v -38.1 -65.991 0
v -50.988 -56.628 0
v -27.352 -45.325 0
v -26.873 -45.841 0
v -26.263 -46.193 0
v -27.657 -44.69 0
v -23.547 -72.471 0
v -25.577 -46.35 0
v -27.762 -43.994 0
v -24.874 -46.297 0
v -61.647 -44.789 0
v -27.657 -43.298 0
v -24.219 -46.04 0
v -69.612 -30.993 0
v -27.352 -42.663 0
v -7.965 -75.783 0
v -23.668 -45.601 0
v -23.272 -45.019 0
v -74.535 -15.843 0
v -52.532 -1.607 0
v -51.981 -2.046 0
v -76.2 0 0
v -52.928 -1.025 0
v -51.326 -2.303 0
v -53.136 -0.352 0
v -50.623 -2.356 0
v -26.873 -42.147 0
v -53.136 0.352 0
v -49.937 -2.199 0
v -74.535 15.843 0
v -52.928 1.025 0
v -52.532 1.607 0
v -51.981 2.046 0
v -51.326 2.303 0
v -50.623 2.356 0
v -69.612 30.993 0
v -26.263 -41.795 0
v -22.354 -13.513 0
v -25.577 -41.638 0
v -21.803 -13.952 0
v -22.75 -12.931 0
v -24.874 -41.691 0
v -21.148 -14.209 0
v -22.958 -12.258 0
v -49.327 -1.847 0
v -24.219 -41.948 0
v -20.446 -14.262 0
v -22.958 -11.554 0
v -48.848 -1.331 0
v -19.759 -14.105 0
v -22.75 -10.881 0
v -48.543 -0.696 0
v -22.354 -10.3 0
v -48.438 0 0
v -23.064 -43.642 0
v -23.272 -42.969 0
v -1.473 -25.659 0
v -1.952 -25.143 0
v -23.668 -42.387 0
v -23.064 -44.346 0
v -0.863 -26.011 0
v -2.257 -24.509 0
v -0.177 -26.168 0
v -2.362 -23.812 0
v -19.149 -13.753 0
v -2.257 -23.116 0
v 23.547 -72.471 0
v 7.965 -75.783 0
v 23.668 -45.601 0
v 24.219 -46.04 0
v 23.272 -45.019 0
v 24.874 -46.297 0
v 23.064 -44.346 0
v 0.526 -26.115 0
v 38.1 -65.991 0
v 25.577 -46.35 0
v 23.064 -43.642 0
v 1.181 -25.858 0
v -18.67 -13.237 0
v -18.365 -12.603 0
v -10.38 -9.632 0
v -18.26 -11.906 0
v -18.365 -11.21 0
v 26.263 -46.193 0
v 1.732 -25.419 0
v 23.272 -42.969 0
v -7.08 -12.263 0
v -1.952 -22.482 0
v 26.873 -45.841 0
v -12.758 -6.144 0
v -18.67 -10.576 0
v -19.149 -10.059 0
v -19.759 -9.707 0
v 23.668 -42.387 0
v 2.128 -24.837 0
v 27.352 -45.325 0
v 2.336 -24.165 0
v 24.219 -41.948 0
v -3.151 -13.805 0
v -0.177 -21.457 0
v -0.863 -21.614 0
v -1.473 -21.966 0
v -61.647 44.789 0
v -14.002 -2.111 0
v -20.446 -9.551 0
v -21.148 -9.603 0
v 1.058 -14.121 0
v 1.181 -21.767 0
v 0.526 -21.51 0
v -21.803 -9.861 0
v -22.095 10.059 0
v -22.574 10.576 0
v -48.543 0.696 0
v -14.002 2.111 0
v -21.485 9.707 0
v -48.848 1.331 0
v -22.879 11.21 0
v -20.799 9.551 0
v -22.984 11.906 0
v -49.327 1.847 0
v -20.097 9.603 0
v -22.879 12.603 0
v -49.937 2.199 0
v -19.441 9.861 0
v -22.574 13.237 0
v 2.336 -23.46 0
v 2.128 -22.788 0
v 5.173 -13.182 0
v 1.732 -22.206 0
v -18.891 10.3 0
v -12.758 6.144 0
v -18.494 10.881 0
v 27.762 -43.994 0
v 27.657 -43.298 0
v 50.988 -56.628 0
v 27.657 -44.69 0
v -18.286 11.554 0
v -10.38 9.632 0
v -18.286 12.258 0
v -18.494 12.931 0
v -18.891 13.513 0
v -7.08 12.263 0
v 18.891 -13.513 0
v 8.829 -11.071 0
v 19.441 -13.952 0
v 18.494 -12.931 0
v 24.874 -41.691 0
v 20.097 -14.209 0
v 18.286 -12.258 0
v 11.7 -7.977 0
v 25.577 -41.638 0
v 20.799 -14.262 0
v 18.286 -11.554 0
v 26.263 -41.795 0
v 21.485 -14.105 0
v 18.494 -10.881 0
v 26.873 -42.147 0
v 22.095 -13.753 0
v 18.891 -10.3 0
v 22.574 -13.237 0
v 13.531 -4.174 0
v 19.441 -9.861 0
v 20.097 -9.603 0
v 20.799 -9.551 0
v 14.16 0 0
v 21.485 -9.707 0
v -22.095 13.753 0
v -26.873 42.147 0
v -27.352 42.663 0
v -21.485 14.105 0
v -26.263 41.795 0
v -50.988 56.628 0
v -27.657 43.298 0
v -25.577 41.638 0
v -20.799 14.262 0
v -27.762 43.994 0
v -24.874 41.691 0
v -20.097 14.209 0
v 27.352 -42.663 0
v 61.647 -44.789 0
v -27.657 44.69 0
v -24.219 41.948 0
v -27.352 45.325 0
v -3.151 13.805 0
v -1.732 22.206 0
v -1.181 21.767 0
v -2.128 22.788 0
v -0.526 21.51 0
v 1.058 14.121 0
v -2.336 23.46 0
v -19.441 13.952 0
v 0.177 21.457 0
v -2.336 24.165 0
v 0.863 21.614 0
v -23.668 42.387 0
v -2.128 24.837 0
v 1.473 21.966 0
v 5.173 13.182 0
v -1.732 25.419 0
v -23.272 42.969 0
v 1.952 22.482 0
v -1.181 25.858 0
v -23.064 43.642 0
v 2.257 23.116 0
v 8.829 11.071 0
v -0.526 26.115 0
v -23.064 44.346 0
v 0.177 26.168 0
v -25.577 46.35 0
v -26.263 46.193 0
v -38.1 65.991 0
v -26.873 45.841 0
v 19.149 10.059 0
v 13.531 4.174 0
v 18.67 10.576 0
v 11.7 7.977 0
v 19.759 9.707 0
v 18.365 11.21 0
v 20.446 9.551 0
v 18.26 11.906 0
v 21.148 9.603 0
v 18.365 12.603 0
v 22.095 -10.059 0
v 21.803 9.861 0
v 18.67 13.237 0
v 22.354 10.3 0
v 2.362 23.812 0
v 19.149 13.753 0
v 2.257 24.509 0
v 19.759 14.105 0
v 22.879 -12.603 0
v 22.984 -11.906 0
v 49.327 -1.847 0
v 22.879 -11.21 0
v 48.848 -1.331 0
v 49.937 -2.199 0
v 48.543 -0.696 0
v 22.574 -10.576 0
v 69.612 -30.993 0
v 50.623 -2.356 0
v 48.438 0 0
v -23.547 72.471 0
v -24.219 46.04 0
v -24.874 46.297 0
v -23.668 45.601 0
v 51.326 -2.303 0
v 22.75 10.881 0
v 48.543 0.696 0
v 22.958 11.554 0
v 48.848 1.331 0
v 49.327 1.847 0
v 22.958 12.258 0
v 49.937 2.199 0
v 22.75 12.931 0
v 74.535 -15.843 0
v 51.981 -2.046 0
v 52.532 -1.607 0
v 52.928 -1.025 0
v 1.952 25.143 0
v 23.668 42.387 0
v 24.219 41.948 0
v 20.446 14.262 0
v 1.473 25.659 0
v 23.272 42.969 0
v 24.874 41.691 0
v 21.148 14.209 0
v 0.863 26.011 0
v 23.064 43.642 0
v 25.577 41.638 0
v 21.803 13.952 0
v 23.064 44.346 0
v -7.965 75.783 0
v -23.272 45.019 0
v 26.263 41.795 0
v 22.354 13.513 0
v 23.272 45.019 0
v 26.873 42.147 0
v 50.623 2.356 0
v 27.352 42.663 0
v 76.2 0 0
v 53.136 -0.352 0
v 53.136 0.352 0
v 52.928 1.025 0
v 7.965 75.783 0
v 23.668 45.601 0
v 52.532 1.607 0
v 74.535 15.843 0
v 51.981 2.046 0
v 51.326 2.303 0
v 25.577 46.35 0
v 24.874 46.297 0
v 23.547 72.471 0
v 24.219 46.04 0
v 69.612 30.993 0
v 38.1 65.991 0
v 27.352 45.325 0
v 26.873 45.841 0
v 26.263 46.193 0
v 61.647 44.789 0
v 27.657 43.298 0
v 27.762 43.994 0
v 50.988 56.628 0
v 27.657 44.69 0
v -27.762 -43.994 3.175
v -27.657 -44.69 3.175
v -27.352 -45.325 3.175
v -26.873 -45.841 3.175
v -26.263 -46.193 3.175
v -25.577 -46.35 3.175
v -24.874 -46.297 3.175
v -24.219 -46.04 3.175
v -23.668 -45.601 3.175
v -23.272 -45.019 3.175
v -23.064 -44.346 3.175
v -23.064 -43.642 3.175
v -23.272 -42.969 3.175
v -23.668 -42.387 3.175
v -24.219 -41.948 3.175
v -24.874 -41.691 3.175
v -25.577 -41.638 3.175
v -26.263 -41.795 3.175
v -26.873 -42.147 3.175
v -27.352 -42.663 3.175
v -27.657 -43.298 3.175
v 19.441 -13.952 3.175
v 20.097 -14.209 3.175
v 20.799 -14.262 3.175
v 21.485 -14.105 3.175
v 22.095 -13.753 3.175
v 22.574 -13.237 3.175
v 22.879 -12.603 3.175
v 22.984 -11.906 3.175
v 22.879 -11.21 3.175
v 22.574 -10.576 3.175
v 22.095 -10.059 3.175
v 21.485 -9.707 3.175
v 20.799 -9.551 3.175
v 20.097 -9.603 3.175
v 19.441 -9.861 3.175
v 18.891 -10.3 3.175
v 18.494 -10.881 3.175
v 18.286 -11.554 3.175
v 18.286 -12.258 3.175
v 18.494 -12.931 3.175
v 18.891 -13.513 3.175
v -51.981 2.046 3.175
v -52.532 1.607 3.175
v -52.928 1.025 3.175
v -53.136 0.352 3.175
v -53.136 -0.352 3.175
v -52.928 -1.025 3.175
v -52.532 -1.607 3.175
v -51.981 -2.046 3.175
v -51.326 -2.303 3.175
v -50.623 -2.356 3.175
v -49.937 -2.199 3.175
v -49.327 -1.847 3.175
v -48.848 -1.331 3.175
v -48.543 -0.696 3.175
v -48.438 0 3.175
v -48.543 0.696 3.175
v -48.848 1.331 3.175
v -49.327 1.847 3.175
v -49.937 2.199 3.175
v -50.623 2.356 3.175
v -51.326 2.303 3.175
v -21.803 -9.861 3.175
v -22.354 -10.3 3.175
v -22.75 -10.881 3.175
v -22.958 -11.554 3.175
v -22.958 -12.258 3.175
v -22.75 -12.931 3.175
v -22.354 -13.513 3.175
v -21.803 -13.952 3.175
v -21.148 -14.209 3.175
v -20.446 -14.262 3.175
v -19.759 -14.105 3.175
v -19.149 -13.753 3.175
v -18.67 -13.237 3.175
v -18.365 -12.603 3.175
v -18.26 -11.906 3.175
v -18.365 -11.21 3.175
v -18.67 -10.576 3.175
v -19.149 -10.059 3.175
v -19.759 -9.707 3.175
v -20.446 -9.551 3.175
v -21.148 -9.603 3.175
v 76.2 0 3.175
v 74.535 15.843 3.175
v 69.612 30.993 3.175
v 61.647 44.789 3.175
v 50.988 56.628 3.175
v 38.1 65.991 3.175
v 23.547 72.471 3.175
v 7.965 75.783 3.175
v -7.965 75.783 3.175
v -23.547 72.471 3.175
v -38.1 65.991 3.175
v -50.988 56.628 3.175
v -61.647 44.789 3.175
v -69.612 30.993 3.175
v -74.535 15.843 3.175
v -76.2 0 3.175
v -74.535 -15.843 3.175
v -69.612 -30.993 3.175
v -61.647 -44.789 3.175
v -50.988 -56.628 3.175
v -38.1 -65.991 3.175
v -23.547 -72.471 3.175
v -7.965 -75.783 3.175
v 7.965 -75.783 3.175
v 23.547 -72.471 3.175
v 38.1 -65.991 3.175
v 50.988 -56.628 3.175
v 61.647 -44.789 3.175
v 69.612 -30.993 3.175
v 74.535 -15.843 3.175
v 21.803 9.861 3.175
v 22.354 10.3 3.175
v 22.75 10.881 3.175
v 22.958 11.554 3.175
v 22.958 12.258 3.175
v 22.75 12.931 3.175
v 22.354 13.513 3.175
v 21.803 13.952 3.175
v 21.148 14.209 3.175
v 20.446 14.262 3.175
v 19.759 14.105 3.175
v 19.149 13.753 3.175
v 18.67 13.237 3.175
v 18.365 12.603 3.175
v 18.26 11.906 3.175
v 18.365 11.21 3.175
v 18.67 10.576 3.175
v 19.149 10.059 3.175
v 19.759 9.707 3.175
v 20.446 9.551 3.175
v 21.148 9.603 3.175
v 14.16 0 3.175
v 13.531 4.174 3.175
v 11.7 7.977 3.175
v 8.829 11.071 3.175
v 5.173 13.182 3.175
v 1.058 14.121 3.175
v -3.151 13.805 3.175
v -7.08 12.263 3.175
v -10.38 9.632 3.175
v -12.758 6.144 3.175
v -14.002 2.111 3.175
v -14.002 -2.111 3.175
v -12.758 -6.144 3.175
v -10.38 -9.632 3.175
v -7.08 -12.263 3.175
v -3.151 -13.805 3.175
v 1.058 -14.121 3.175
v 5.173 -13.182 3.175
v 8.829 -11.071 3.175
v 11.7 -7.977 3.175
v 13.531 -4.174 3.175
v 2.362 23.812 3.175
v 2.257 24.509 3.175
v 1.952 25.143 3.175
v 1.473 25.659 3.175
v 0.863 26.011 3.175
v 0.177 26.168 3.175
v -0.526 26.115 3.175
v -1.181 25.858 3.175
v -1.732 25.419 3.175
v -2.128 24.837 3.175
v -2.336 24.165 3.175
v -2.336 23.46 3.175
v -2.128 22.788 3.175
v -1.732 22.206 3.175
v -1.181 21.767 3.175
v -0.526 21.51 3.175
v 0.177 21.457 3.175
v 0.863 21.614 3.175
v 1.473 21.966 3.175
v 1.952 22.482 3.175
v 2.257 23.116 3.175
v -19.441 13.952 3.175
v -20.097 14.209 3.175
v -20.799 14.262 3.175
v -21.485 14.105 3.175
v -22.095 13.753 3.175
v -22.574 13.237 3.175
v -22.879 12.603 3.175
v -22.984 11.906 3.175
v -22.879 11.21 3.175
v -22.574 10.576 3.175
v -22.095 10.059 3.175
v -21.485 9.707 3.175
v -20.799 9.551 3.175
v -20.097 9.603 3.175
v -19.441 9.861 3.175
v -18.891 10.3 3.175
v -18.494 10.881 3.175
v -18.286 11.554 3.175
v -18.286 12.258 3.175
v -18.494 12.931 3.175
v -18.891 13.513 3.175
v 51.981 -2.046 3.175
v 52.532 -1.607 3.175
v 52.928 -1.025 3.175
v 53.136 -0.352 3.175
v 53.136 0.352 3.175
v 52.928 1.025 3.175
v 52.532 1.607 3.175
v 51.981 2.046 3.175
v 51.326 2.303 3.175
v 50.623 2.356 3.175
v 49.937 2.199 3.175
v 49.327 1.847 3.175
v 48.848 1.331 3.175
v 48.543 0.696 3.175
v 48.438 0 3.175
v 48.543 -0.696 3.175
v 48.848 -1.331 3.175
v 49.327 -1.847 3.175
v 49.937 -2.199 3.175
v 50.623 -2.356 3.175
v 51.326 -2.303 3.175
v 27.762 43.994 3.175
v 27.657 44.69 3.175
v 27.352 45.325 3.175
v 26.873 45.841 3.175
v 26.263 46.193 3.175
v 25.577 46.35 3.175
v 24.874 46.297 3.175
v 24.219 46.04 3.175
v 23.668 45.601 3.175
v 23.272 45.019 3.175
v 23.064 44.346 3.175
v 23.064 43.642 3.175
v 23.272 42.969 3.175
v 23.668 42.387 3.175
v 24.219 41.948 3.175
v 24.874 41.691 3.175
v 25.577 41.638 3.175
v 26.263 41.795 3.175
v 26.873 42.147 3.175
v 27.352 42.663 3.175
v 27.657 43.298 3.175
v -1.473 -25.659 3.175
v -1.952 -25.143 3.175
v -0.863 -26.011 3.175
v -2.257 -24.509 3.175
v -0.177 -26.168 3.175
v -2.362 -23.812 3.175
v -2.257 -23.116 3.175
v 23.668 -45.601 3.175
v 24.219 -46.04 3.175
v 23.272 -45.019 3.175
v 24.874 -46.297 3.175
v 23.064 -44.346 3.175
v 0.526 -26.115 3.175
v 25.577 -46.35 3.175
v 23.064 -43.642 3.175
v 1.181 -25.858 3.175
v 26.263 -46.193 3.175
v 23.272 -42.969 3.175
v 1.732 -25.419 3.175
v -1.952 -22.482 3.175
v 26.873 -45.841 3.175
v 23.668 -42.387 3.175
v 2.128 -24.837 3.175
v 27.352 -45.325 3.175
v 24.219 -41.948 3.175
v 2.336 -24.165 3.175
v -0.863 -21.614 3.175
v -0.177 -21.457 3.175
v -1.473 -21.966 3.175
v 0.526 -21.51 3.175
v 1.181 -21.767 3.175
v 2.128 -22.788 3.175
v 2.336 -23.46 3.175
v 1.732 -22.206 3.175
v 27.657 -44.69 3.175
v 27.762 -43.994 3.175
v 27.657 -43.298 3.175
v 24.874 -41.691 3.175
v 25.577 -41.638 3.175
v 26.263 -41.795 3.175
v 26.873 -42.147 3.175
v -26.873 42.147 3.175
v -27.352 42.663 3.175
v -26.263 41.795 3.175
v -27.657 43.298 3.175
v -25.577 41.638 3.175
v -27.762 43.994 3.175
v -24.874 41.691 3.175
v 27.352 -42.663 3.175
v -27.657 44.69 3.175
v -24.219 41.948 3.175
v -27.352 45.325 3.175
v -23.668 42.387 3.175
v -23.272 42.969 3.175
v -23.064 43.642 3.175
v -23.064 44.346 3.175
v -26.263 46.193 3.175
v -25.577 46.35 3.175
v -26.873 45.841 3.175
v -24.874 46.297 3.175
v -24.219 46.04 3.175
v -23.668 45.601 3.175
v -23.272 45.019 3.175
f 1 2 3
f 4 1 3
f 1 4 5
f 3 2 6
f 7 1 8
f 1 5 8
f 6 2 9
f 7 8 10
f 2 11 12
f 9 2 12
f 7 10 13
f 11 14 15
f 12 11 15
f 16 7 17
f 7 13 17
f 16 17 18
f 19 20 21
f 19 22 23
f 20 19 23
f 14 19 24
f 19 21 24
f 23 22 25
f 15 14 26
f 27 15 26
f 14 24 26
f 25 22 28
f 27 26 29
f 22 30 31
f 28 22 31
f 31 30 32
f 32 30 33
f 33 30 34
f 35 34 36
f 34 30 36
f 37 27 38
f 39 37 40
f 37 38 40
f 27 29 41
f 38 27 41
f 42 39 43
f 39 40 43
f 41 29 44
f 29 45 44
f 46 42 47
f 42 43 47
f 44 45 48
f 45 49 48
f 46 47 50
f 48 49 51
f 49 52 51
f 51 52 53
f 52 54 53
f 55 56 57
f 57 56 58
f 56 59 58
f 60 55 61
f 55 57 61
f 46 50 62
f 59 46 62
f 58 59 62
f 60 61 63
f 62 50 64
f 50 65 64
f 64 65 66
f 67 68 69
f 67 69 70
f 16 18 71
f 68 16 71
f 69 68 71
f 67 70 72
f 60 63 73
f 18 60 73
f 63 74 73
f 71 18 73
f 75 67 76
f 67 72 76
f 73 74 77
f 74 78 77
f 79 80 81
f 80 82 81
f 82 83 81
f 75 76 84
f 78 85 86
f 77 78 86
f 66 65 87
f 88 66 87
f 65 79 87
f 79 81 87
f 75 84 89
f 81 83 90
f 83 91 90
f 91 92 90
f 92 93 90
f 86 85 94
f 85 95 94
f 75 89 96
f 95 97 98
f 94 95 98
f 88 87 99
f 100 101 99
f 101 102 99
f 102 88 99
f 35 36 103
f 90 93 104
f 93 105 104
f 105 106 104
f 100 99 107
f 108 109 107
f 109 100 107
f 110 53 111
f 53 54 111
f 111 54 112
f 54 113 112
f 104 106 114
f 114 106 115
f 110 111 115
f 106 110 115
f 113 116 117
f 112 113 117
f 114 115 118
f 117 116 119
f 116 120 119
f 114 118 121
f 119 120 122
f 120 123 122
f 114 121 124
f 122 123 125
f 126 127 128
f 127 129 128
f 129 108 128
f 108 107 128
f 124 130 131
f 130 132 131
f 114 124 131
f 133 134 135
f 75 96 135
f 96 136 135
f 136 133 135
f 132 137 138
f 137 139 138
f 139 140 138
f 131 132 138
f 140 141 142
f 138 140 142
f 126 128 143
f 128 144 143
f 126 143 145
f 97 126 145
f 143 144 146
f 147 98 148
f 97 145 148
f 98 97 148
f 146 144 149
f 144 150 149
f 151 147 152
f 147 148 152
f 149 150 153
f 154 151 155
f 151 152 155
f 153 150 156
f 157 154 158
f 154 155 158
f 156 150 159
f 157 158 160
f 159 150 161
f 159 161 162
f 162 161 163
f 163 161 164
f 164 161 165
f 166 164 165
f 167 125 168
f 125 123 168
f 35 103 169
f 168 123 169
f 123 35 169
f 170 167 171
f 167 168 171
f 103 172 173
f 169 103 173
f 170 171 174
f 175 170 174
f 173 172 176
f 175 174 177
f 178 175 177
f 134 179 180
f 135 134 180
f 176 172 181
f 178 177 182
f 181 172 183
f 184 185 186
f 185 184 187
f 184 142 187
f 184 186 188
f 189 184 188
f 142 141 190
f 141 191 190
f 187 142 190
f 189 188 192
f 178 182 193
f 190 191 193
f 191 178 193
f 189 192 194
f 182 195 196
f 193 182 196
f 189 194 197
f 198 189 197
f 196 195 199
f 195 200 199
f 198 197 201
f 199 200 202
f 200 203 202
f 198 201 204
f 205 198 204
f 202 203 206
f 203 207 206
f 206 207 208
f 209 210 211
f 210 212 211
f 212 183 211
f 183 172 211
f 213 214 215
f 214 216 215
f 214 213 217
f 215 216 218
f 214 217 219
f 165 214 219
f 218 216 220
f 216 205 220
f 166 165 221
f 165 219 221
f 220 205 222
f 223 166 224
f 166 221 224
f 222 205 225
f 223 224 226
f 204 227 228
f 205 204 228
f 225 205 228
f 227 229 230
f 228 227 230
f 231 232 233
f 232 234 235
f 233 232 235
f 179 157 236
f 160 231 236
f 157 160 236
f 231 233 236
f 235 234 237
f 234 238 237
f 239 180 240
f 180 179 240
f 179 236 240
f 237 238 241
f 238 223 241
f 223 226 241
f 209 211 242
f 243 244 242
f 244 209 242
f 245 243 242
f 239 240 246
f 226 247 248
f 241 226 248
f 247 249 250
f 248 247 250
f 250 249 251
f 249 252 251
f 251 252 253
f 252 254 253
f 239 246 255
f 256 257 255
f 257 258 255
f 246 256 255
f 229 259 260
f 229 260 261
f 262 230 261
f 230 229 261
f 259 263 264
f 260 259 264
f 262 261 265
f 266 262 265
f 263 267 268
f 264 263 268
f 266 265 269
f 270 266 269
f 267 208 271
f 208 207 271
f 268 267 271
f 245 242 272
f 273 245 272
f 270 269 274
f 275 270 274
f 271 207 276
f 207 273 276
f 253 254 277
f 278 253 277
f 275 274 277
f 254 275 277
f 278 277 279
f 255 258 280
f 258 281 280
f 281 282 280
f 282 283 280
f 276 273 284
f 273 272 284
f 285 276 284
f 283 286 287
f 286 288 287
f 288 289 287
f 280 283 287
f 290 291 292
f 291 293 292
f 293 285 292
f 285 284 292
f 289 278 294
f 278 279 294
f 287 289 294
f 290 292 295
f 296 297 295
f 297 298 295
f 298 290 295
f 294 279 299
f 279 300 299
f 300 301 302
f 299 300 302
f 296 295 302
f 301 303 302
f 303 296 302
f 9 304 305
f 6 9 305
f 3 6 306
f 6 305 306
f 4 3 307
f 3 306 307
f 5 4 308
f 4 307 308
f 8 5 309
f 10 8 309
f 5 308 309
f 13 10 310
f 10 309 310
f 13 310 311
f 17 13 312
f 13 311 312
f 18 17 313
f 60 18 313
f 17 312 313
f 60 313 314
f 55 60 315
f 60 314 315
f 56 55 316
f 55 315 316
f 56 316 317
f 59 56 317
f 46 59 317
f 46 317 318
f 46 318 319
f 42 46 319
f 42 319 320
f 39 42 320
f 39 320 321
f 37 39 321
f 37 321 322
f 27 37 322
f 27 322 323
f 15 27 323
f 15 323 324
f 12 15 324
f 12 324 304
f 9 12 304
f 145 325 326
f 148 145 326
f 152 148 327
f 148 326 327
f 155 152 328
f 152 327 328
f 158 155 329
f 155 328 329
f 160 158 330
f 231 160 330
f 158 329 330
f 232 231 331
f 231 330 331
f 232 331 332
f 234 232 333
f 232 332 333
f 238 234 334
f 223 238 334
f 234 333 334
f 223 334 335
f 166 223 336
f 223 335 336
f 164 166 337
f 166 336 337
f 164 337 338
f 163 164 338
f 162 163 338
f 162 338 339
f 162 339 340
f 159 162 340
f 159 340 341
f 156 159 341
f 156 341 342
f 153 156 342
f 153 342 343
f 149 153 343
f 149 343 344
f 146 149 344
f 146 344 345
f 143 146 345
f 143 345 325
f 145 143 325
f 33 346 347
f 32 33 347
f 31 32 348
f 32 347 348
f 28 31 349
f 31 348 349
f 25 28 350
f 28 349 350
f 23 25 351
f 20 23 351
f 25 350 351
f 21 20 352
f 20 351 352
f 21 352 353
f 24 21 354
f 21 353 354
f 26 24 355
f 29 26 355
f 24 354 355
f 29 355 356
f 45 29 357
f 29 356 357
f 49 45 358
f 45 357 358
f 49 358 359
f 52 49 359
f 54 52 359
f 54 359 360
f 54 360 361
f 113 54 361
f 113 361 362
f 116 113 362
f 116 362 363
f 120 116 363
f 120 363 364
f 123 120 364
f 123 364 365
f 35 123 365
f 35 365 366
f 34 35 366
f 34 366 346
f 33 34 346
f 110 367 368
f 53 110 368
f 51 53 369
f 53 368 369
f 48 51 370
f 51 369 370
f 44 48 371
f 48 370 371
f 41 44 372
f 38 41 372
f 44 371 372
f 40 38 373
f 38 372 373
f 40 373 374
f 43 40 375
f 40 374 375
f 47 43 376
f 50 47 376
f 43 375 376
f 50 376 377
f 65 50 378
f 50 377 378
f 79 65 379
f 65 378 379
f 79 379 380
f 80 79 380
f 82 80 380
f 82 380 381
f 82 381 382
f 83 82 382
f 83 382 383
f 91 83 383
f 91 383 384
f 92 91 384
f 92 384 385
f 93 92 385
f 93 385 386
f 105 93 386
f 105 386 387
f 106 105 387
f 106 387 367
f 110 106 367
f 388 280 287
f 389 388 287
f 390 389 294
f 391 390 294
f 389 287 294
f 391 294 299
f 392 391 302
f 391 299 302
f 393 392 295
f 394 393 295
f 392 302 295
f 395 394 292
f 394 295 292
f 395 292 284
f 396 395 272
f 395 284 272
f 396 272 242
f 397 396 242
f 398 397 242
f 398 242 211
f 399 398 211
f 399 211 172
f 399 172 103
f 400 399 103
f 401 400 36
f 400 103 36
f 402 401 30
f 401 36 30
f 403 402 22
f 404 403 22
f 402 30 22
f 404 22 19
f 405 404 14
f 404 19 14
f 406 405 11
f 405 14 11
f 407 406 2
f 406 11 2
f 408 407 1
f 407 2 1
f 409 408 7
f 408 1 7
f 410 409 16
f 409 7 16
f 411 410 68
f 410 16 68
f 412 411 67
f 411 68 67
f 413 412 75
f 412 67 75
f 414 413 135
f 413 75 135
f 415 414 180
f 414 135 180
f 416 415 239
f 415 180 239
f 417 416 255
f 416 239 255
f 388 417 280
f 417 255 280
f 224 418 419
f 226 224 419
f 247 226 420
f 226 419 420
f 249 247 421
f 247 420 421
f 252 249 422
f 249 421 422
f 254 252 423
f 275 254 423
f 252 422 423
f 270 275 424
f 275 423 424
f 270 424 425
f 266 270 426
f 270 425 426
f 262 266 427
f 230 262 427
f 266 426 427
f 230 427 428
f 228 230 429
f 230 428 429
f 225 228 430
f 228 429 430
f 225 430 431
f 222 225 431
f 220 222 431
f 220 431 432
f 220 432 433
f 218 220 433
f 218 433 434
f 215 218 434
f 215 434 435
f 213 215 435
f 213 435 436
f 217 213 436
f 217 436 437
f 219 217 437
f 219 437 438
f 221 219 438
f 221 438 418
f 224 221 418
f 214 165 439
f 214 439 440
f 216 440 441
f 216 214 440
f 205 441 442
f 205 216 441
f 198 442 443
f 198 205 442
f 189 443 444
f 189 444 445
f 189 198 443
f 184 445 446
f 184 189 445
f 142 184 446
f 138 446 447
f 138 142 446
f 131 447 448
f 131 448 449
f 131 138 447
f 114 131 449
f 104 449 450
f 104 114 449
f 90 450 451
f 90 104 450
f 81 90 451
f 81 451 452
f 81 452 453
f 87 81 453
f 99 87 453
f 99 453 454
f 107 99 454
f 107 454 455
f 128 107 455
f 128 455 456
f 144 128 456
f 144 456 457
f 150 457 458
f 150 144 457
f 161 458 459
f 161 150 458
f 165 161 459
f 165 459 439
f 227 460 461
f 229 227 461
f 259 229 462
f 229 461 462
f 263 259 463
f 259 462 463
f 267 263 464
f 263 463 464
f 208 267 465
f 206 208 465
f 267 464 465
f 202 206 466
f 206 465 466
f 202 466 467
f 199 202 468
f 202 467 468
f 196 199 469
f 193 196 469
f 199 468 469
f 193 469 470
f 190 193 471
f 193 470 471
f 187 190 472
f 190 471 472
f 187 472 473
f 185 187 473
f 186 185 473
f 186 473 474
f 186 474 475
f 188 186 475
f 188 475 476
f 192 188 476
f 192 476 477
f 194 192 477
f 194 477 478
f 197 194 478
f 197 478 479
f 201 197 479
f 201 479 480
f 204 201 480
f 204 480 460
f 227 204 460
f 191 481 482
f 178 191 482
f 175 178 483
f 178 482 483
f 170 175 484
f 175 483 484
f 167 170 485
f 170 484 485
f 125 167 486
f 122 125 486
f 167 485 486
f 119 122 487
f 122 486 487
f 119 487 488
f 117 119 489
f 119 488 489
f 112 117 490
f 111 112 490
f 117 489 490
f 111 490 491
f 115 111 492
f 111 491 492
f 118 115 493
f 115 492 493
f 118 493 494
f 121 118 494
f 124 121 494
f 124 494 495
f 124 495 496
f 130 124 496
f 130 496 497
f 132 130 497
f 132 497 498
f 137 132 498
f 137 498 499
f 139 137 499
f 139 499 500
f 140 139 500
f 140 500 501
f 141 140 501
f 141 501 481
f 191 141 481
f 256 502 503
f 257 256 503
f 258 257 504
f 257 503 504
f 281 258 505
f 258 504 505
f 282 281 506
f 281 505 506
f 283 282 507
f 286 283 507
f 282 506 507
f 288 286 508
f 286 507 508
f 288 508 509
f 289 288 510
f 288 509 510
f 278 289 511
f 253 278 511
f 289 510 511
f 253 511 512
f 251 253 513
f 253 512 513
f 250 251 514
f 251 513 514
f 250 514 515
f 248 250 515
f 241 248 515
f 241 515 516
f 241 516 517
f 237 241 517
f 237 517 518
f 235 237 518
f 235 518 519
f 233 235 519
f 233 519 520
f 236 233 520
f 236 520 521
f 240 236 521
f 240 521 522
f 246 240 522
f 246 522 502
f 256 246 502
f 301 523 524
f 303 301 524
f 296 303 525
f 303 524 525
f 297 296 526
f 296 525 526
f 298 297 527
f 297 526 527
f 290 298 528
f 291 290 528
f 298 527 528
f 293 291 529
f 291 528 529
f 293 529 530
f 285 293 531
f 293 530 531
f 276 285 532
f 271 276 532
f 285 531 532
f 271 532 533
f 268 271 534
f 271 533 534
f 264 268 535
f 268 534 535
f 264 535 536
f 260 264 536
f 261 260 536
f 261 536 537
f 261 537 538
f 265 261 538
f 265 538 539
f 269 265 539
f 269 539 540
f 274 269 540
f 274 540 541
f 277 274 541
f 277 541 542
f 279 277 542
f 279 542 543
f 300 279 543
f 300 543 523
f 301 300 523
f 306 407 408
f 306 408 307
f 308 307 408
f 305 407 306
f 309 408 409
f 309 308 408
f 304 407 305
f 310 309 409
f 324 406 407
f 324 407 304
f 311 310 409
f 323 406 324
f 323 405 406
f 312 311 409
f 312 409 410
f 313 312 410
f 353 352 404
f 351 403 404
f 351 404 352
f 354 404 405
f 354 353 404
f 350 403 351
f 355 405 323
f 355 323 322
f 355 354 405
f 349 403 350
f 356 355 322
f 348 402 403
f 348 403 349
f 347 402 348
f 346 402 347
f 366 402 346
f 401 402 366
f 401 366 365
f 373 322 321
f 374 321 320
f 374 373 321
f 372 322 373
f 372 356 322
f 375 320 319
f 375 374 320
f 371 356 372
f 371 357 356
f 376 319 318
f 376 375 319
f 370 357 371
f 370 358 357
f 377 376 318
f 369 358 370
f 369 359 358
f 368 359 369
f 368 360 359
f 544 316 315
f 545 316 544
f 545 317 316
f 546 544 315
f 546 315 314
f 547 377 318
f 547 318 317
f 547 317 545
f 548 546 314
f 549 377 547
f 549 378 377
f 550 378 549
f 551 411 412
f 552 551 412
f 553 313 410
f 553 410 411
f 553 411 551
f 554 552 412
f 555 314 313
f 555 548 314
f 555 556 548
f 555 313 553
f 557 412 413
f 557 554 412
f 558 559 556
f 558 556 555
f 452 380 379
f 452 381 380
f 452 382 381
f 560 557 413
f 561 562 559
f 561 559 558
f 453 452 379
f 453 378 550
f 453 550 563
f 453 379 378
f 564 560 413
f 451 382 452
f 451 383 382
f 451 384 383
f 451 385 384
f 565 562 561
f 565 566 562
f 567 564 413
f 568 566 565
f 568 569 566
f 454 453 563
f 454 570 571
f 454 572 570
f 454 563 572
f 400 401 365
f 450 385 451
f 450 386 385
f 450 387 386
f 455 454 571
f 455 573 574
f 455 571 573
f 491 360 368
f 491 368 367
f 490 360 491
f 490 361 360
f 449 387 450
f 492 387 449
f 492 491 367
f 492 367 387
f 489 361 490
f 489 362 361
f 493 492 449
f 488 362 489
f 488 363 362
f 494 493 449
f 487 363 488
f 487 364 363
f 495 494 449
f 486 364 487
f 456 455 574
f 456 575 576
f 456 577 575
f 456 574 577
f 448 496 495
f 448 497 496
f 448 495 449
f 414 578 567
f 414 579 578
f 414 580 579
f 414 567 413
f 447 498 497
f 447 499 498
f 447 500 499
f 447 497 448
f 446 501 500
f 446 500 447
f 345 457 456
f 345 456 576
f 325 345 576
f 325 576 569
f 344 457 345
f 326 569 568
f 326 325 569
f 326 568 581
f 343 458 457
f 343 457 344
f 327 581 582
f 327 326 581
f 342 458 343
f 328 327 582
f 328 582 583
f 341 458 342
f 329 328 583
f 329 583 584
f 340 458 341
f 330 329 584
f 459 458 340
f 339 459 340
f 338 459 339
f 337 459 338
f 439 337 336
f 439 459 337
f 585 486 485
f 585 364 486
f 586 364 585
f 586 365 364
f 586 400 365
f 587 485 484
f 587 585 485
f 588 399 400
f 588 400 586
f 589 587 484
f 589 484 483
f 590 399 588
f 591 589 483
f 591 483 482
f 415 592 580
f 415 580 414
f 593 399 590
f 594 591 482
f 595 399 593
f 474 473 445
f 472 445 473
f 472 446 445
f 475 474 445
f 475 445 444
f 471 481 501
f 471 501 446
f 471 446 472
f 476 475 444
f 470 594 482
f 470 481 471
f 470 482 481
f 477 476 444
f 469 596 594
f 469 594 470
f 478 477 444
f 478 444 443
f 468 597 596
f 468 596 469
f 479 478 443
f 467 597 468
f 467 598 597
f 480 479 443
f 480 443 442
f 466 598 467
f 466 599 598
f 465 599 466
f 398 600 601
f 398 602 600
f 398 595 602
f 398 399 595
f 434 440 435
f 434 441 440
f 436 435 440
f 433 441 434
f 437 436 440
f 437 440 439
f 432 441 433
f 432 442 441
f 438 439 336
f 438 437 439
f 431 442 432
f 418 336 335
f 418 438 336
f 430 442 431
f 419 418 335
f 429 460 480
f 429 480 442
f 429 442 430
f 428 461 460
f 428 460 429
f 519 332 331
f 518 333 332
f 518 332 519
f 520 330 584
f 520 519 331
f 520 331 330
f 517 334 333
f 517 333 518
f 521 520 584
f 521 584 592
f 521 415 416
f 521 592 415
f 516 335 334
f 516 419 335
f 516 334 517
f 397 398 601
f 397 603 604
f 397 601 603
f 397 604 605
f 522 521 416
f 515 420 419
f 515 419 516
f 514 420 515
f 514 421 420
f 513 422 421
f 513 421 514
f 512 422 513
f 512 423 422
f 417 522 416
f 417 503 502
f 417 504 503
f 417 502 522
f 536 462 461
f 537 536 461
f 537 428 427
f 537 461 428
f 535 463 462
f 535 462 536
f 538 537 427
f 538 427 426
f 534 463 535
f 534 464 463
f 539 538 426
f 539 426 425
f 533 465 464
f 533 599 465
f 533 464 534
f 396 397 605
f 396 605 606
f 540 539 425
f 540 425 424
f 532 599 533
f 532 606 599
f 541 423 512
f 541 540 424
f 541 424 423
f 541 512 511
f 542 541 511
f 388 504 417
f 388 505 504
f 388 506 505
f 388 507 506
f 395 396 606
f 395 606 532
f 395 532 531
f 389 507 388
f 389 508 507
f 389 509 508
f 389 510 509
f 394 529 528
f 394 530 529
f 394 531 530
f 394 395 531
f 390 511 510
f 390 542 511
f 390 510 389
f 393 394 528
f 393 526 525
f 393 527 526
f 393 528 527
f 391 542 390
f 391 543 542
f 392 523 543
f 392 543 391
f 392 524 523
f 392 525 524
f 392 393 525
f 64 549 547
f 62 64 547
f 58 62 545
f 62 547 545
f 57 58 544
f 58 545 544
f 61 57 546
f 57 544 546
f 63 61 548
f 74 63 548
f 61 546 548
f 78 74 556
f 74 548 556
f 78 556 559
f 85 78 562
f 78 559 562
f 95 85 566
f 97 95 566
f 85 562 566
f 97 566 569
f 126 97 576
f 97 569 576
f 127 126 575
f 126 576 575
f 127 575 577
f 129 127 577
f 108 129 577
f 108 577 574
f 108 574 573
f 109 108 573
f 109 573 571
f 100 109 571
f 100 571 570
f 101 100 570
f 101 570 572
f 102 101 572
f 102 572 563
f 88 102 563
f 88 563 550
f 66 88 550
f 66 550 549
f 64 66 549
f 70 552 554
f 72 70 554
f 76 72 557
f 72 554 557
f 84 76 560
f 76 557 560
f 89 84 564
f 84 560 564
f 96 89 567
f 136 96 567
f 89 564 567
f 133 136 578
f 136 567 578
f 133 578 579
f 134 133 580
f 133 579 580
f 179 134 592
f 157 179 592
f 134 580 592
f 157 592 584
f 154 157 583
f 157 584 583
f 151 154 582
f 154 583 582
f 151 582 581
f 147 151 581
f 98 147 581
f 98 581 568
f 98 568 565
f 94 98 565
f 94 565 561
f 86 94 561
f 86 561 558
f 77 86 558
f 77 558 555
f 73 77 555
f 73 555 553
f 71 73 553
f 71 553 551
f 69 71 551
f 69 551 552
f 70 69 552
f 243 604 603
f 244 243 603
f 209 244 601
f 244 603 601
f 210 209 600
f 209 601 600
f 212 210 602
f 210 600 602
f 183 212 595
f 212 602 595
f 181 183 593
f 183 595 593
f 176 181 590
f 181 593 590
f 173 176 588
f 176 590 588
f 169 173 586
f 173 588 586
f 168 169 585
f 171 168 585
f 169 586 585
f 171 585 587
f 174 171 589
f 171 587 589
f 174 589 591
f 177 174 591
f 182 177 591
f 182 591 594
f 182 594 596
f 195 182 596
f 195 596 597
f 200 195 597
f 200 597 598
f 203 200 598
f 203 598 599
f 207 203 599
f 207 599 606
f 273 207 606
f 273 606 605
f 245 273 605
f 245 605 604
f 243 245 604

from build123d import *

# Parameters (mm, degrees)
F0_R            = 76.2
F0_R_2          = 14.1605
F1_DEPTH        = 3.175
F2_R            = 2.3622
F3_DEPTH        = 3.176
F3_COPIES_COUNT = 6


# Not quite as in the source:
# - a pattern or mirror of a feature is missing from the dataset's text; its kind, count and spacing are read off the source's solid


with BuildPart() as f1:
    # F0 (on Top) → F1 (new body)
    with BuildSketch(Plane.XY):
        Circle(F0_R)
        Circle(F0_R_2, mode=Mode.SUBTRACT)
    extrude(amount=F1_DEPTH)

    # F2 (on face) → F3 (cut, through all)
    with BuildSketch(Plane.XY.offset(3.175)):
        with Locations((0, 23.8125)):
            Circle(F2_R)
        with Locations((25.4, 43.9940905122)):
            Circle(F2_R)
    f3 = extrude(amount=-F3_DEPTH, mode=Mode.SUBTRACT)

    # F3_copies: F3 ×6 about axis
    f3_copies_axis = Axis((0, 0, 0), (0, 0, 1))
    for i in range(1, F3_COPIES_COUNT):
        add(f3.rotate(f3_copies_axis, i * 360 / F3_COPIES_COUNT), mode=Mode.SUBTRACT)


solid = f1.part
